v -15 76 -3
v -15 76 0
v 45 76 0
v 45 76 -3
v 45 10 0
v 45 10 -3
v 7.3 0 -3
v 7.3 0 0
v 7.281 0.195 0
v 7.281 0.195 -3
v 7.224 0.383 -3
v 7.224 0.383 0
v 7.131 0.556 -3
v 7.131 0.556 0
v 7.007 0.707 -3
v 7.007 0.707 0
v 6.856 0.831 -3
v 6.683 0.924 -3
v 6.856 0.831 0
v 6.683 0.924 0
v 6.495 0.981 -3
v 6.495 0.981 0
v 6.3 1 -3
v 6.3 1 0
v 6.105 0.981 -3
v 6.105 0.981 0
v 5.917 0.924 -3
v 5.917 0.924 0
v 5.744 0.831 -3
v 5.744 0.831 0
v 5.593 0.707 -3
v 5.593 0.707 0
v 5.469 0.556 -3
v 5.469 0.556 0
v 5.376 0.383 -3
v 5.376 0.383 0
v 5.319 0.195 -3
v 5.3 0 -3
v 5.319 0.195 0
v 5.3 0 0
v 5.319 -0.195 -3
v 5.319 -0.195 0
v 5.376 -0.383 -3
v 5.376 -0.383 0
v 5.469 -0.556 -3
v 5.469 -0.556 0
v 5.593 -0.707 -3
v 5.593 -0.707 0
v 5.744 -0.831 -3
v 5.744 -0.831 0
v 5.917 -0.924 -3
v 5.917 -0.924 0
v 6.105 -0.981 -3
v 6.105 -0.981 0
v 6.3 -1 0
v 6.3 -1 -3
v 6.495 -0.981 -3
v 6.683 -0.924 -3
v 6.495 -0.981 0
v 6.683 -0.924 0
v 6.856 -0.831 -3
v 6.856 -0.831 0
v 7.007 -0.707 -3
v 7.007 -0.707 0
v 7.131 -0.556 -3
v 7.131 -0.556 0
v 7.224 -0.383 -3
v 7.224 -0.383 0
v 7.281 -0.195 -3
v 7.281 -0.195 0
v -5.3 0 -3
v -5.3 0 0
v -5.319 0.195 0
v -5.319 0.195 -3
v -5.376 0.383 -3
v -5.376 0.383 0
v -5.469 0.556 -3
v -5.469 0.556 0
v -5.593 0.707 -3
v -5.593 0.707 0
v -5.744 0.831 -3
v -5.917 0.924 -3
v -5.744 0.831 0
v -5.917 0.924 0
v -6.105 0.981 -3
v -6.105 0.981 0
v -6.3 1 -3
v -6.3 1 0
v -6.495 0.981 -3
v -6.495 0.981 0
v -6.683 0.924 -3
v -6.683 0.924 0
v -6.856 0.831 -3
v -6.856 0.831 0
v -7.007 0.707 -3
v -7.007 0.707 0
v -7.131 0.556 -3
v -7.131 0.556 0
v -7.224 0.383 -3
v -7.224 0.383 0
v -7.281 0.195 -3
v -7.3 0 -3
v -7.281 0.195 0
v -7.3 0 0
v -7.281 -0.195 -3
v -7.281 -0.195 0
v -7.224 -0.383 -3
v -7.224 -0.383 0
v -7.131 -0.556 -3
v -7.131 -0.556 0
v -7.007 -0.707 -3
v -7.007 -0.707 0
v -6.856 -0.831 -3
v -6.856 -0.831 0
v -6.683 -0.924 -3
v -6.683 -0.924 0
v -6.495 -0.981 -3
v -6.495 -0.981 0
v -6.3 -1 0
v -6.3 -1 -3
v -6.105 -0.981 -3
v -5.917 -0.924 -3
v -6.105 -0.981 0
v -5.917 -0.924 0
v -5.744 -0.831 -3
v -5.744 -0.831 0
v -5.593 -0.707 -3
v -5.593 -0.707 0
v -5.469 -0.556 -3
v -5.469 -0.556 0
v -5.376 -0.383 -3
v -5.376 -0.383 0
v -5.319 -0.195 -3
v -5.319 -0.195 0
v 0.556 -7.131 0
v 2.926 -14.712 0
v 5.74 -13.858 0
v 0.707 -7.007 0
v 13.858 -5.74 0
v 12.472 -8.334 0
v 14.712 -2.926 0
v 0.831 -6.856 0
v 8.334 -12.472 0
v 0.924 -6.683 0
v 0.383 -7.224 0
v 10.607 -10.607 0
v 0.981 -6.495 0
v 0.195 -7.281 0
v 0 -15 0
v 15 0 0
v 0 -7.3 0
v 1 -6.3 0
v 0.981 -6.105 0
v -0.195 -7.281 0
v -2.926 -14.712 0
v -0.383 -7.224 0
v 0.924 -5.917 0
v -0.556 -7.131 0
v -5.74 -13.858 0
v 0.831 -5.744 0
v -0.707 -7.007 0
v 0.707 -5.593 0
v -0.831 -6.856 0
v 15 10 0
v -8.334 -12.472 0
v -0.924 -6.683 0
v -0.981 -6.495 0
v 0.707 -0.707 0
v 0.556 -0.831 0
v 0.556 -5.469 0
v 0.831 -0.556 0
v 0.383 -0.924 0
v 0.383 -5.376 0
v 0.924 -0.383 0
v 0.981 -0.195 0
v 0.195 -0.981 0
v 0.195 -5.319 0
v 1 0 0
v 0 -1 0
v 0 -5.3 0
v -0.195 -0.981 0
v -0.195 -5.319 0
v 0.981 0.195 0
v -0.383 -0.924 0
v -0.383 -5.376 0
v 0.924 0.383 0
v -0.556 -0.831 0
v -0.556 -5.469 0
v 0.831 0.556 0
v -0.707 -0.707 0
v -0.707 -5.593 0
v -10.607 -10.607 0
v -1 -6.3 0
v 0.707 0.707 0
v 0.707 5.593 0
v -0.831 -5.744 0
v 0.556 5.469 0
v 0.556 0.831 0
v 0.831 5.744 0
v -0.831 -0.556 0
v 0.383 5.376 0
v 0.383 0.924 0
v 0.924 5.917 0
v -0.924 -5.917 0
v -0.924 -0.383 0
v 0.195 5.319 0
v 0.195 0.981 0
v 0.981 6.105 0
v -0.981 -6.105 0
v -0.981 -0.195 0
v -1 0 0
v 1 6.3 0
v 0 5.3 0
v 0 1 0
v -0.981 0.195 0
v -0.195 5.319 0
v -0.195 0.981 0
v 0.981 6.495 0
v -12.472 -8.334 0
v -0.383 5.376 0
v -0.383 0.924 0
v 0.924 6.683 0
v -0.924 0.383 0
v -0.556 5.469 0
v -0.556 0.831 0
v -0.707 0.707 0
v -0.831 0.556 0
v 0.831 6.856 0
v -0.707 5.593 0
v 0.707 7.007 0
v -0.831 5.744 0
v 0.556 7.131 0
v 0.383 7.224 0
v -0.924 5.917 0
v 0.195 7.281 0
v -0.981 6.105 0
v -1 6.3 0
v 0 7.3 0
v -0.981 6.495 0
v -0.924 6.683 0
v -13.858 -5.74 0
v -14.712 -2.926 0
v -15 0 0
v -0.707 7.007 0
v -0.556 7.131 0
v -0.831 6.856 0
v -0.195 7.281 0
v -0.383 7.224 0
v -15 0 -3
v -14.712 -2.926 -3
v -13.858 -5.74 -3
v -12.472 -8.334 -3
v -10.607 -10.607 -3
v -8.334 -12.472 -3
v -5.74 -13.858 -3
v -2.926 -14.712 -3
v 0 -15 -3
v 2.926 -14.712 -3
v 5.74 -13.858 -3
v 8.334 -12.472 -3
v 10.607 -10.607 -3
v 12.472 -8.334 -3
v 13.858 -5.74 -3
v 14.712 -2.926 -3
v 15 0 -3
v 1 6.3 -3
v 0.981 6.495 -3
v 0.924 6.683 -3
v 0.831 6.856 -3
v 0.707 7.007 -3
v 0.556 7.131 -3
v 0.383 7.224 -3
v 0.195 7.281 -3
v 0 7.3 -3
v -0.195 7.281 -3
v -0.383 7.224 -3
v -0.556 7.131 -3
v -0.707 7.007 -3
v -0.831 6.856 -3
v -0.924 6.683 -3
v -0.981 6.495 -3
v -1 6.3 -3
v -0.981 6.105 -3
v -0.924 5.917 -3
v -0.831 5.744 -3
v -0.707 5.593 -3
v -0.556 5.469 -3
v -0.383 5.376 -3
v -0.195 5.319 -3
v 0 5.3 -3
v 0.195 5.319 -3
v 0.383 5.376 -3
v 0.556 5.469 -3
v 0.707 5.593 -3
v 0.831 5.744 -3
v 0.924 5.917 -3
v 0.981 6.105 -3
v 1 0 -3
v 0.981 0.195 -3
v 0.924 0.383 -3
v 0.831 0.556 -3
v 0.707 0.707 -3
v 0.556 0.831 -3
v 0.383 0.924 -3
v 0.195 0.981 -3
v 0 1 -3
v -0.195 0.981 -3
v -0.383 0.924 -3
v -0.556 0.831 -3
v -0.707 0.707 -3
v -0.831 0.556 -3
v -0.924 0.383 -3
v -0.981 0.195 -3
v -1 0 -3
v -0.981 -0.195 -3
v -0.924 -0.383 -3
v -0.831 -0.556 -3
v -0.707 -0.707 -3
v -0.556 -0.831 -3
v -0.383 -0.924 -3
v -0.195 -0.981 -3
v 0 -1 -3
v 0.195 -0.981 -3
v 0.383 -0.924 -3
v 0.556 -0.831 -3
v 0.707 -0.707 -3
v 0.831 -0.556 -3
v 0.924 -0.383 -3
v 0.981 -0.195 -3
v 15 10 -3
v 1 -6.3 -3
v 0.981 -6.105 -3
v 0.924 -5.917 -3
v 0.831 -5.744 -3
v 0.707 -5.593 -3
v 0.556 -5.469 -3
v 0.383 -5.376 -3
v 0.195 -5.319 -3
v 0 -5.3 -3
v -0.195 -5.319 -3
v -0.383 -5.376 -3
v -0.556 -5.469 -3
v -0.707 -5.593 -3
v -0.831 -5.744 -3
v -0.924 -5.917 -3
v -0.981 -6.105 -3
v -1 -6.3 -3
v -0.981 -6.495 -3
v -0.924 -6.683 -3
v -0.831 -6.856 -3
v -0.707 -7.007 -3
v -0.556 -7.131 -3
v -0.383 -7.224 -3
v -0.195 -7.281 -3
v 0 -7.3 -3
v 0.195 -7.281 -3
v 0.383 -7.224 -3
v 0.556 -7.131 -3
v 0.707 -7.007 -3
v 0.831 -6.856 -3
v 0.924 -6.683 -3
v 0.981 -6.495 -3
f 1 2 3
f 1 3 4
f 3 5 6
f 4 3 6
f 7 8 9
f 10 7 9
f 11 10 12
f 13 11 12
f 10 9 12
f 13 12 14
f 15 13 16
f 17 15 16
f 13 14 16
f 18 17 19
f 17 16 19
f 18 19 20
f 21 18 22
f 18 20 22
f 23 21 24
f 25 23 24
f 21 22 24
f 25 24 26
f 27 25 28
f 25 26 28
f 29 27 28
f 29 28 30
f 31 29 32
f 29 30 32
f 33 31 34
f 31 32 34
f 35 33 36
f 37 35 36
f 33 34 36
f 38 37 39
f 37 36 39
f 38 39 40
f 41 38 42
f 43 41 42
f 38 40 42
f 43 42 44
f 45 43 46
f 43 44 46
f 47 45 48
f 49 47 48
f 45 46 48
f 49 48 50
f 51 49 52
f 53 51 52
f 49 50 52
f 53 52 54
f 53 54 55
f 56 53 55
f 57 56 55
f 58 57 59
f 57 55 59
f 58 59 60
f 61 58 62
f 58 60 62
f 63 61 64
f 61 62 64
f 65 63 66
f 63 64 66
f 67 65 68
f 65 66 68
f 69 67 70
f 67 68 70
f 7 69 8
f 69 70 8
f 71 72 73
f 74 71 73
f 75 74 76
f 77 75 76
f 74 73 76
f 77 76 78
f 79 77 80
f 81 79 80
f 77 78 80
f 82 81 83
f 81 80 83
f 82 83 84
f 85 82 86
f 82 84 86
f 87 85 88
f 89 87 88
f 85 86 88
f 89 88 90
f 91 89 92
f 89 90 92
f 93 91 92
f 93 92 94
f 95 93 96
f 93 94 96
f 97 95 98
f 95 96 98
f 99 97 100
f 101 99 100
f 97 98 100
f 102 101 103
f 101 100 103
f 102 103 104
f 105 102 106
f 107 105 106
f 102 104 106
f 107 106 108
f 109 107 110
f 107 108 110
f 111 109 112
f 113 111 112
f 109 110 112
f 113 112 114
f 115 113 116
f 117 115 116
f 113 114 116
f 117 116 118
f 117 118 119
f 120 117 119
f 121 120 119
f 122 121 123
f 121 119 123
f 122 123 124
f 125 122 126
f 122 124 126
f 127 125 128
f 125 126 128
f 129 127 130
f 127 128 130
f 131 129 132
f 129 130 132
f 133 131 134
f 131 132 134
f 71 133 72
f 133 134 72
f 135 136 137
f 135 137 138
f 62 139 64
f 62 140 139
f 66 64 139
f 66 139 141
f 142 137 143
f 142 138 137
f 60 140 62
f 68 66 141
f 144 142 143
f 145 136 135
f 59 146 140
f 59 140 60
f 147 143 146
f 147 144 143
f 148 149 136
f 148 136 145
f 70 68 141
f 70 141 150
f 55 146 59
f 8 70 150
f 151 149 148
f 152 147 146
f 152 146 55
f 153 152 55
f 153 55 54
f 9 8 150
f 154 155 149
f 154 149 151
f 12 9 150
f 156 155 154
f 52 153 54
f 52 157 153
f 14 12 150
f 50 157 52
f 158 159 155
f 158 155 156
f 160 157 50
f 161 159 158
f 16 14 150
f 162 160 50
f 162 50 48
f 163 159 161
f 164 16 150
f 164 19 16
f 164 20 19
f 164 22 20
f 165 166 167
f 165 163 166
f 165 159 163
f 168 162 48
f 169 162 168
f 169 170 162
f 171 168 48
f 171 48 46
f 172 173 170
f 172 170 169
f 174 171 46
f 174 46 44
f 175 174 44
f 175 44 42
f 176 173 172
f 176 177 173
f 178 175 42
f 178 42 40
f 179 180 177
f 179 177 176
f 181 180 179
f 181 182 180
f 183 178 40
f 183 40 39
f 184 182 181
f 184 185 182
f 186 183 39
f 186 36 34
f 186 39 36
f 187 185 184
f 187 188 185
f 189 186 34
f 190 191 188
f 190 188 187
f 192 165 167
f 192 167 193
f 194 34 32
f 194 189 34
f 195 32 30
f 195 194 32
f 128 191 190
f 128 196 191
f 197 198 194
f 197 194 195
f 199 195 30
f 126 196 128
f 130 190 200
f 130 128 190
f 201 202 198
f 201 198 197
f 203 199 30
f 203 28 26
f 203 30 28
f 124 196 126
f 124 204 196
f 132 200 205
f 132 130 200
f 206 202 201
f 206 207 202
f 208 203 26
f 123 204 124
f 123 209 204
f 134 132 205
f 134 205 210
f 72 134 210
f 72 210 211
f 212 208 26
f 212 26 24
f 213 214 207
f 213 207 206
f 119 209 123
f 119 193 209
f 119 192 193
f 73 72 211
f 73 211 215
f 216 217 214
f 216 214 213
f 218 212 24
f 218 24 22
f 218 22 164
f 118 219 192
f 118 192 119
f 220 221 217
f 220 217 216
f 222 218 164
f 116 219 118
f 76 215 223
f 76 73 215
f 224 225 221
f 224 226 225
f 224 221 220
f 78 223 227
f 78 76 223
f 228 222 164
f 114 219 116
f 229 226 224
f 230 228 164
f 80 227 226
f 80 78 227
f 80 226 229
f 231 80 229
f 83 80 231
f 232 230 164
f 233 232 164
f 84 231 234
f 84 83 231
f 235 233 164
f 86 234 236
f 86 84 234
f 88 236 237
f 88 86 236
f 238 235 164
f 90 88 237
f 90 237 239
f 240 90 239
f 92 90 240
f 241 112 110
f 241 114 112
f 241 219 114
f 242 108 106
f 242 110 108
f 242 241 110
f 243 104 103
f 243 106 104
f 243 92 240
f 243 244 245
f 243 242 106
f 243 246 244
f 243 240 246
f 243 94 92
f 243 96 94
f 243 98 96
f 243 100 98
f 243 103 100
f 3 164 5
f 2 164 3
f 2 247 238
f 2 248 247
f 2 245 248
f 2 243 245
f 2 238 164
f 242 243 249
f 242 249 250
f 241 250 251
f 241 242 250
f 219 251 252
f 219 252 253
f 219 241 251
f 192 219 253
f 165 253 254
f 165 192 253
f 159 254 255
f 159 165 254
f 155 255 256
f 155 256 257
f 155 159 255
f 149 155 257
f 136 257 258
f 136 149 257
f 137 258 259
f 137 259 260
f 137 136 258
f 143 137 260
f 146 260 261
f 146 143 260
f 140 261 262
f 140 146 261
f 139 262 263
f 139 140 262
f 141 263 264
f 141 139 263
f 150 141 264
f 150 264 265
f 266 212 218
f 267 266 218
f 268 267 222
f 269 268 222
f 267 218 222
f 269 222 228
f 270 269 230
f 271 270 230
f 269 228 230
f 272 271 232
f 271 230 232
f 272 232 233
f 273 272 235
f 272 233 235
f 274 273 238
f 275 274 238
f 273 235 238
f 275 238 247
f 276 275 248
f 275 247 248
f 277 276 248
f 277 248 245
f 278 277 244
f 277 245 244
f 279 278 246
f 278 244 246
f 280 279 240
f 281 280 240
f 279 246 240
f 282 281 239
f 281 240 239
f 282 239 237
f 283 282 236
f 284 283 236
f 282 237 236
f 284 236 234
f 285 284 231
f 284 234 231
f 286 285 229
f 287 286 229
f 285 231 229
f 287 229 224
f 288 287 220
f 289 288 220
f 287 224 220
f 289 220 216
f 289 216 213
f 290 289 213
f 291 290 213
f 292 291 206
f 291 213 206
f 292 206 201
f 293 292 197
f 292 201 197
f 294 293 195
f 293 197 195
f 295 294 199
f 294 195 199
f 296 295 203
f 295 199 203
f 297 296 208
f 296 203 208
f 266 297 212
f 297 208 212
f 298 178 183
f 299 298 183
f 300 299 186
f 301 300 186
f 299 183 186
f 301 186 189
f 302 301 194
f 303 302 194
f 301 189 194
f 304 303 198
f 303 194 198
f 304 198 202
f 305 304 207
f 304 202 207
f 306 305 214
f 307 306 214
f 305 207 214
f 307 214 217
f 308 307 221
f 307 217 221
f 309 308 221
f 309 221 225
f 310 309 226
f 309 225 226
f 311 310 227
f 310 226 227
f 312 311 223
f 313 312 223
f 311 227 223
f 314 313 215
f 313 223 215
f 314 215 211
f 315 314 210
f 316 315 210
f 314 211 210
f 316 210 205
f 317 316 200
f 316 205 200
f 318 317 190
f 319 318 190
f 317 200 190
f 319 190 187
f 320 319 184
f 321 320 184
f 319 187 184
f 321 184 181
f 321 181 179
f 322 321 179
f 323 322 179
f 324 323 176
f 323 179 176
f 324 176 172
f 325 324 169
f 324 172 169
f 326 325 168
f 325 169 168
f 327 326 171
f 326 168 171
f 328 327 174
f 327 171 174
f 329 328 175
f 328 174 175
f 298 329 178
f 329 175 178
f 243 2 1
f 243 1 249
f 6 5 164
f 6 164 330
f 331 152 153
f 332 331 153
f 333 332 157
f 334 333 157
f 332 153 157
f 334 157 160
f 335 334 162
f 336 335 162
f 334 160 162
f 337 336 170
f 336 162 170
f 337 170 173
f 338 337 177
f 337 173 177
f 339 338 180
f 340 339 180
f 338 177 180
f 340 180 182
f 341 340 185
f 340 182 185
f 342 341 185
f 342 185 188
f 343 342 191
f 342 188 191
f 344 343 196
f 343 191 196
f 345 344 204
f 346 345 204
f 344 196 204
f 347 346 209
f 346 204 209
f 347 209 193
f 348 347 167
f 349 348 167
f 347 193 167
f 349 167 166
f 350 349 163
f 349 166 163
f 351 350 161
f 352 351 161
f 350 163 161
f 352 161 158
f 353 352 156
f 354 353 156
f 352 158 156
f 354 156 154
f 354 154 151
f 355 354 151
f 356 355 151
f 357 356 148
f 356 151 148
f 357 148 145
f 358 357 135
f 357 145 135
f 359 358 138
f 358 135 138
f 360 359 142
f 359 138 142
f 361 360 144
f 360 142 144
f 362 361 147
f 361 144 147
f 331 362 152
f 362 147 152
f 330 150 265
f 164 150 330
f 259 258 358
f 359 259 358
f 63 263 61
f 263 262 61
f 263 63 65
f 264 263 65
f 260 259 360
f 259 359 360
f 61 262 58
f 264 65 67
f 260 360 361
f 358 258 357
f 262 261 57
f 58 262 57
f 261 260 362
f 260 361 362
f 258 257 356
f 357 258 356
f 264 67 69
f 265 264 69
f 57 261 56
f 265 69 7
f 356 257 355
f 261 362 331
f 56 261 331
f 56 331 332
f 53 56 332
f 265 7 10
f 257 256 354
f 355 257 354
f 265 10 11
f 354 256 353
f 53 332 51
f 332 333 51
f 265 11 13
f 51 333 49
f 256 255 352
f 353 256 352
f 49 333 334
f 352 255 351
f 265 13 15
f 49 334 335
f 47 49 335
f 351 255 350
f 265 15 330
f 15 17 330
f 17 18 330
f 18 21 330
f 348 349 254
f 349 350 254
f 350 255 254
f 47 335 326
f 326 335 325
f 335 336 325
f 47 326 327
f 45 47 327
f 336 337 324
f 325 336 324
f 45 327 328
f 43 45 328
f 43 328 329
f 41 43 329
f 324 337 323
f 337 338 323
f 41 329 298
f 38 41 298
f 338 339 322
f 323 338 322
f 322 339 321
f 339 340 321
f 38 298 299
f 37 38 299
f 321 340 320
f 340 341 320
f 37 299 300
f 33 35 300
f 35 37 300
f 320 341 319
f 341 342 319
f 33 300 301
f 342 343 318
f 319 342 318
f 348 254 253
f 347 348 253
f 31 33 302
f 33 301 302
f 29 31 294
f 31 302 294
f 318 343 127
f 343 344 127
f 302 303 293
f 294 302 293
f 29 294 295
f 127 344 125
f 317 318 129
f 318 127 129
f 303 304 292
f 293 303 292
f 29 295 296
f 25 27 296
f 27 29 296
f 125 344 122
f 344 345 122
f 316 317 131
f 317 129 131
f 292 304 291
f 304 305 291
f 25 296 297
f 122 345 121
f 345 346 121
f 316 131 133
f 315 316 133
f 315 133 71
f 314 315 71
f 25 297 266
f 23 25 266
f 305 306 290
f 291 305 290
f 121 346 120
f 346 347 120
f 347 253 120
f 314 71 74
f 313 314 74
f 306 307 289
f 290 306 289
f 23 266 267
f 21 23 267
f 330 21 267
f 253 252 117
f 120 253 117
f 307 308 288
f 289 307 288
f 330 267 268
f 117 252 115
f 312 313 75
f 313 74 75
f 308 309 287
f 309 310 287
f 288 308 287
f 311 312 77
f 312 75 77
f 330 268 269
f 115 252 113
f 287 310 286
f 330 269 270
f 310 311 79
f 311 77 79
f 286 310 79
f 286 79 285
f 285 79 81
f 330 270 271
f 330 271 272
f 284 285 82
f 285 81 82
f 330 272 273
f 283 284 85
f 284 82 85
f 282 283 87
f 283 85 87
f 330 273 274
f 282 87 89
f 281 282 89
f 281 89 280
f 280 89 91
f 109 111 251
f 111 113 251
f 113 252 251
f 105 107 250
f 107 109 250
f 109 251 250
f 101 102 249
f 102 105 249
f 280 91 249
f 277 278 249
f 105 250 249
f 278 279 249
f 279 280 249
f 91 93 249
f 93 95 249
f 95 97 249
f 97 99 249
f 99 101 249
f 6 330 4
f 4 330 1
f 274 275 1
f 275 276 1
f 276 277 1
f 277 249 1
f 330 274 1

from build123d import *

# Parameters (mm, degrees)
SKETCH_1_R      = 15
SKETCH_1_R_2    = 1
EXTRUDE_1_DEPTH = 3
SKETCH_2_W      = 3
SKETCH_2_H      = 66
EXTRUDE_2_DEPTH = 30


with BuildPart() as part:
    # 草圖1 → 填料-伸長1 (new body)
    with BuildSketch(Plane.XY):
        Circle(SKETCH_1_R)
        with Locations((0, 6.3)):
            Circle(SKETCH_1_R_2, mode=Mode.SUBTRACT)
        with Locations((-6.3, 0)):
            Circle(SKETCH_1_R_2, mode=Mode.SUBTRACT)
        with Locations((0, -6.3)):
            Circle(SKETCH_1_R_2, mode=Mode.SUBTRACT)
        with Locations((6.3, 0)):
            Circle(SKETCH_1_R_2, mode=Mode.SUBTRACT)
        Circle(SKETCH_1_R_2, mode=Mode.SUBTRACT)
        with BuildLine():
            Line((-15, 76), (-15, 0))
            ThreePointArc((-15, 0), (0, 15), (15, 0))
            Line((15, 0), (15, 76))
            Line((15, 76), (-15, 76))
        make_face()
    extrude(amount=-EXTRUDE_1_DEPTH)

    # 草圖2 → 填料-伸長2 (add)
    with BuildSketch(Plane(origin=(15, 0, 0), x_dir=(0, 0, -1), z_dir=(1, 0, 0))):
        with Locations((1.5, 43)):
            Rectangle(SKETCH_2_W, SKETCH_2_H)
    extrude(amount=EXTRUDE_2_DEPTH)


solid = part.part
